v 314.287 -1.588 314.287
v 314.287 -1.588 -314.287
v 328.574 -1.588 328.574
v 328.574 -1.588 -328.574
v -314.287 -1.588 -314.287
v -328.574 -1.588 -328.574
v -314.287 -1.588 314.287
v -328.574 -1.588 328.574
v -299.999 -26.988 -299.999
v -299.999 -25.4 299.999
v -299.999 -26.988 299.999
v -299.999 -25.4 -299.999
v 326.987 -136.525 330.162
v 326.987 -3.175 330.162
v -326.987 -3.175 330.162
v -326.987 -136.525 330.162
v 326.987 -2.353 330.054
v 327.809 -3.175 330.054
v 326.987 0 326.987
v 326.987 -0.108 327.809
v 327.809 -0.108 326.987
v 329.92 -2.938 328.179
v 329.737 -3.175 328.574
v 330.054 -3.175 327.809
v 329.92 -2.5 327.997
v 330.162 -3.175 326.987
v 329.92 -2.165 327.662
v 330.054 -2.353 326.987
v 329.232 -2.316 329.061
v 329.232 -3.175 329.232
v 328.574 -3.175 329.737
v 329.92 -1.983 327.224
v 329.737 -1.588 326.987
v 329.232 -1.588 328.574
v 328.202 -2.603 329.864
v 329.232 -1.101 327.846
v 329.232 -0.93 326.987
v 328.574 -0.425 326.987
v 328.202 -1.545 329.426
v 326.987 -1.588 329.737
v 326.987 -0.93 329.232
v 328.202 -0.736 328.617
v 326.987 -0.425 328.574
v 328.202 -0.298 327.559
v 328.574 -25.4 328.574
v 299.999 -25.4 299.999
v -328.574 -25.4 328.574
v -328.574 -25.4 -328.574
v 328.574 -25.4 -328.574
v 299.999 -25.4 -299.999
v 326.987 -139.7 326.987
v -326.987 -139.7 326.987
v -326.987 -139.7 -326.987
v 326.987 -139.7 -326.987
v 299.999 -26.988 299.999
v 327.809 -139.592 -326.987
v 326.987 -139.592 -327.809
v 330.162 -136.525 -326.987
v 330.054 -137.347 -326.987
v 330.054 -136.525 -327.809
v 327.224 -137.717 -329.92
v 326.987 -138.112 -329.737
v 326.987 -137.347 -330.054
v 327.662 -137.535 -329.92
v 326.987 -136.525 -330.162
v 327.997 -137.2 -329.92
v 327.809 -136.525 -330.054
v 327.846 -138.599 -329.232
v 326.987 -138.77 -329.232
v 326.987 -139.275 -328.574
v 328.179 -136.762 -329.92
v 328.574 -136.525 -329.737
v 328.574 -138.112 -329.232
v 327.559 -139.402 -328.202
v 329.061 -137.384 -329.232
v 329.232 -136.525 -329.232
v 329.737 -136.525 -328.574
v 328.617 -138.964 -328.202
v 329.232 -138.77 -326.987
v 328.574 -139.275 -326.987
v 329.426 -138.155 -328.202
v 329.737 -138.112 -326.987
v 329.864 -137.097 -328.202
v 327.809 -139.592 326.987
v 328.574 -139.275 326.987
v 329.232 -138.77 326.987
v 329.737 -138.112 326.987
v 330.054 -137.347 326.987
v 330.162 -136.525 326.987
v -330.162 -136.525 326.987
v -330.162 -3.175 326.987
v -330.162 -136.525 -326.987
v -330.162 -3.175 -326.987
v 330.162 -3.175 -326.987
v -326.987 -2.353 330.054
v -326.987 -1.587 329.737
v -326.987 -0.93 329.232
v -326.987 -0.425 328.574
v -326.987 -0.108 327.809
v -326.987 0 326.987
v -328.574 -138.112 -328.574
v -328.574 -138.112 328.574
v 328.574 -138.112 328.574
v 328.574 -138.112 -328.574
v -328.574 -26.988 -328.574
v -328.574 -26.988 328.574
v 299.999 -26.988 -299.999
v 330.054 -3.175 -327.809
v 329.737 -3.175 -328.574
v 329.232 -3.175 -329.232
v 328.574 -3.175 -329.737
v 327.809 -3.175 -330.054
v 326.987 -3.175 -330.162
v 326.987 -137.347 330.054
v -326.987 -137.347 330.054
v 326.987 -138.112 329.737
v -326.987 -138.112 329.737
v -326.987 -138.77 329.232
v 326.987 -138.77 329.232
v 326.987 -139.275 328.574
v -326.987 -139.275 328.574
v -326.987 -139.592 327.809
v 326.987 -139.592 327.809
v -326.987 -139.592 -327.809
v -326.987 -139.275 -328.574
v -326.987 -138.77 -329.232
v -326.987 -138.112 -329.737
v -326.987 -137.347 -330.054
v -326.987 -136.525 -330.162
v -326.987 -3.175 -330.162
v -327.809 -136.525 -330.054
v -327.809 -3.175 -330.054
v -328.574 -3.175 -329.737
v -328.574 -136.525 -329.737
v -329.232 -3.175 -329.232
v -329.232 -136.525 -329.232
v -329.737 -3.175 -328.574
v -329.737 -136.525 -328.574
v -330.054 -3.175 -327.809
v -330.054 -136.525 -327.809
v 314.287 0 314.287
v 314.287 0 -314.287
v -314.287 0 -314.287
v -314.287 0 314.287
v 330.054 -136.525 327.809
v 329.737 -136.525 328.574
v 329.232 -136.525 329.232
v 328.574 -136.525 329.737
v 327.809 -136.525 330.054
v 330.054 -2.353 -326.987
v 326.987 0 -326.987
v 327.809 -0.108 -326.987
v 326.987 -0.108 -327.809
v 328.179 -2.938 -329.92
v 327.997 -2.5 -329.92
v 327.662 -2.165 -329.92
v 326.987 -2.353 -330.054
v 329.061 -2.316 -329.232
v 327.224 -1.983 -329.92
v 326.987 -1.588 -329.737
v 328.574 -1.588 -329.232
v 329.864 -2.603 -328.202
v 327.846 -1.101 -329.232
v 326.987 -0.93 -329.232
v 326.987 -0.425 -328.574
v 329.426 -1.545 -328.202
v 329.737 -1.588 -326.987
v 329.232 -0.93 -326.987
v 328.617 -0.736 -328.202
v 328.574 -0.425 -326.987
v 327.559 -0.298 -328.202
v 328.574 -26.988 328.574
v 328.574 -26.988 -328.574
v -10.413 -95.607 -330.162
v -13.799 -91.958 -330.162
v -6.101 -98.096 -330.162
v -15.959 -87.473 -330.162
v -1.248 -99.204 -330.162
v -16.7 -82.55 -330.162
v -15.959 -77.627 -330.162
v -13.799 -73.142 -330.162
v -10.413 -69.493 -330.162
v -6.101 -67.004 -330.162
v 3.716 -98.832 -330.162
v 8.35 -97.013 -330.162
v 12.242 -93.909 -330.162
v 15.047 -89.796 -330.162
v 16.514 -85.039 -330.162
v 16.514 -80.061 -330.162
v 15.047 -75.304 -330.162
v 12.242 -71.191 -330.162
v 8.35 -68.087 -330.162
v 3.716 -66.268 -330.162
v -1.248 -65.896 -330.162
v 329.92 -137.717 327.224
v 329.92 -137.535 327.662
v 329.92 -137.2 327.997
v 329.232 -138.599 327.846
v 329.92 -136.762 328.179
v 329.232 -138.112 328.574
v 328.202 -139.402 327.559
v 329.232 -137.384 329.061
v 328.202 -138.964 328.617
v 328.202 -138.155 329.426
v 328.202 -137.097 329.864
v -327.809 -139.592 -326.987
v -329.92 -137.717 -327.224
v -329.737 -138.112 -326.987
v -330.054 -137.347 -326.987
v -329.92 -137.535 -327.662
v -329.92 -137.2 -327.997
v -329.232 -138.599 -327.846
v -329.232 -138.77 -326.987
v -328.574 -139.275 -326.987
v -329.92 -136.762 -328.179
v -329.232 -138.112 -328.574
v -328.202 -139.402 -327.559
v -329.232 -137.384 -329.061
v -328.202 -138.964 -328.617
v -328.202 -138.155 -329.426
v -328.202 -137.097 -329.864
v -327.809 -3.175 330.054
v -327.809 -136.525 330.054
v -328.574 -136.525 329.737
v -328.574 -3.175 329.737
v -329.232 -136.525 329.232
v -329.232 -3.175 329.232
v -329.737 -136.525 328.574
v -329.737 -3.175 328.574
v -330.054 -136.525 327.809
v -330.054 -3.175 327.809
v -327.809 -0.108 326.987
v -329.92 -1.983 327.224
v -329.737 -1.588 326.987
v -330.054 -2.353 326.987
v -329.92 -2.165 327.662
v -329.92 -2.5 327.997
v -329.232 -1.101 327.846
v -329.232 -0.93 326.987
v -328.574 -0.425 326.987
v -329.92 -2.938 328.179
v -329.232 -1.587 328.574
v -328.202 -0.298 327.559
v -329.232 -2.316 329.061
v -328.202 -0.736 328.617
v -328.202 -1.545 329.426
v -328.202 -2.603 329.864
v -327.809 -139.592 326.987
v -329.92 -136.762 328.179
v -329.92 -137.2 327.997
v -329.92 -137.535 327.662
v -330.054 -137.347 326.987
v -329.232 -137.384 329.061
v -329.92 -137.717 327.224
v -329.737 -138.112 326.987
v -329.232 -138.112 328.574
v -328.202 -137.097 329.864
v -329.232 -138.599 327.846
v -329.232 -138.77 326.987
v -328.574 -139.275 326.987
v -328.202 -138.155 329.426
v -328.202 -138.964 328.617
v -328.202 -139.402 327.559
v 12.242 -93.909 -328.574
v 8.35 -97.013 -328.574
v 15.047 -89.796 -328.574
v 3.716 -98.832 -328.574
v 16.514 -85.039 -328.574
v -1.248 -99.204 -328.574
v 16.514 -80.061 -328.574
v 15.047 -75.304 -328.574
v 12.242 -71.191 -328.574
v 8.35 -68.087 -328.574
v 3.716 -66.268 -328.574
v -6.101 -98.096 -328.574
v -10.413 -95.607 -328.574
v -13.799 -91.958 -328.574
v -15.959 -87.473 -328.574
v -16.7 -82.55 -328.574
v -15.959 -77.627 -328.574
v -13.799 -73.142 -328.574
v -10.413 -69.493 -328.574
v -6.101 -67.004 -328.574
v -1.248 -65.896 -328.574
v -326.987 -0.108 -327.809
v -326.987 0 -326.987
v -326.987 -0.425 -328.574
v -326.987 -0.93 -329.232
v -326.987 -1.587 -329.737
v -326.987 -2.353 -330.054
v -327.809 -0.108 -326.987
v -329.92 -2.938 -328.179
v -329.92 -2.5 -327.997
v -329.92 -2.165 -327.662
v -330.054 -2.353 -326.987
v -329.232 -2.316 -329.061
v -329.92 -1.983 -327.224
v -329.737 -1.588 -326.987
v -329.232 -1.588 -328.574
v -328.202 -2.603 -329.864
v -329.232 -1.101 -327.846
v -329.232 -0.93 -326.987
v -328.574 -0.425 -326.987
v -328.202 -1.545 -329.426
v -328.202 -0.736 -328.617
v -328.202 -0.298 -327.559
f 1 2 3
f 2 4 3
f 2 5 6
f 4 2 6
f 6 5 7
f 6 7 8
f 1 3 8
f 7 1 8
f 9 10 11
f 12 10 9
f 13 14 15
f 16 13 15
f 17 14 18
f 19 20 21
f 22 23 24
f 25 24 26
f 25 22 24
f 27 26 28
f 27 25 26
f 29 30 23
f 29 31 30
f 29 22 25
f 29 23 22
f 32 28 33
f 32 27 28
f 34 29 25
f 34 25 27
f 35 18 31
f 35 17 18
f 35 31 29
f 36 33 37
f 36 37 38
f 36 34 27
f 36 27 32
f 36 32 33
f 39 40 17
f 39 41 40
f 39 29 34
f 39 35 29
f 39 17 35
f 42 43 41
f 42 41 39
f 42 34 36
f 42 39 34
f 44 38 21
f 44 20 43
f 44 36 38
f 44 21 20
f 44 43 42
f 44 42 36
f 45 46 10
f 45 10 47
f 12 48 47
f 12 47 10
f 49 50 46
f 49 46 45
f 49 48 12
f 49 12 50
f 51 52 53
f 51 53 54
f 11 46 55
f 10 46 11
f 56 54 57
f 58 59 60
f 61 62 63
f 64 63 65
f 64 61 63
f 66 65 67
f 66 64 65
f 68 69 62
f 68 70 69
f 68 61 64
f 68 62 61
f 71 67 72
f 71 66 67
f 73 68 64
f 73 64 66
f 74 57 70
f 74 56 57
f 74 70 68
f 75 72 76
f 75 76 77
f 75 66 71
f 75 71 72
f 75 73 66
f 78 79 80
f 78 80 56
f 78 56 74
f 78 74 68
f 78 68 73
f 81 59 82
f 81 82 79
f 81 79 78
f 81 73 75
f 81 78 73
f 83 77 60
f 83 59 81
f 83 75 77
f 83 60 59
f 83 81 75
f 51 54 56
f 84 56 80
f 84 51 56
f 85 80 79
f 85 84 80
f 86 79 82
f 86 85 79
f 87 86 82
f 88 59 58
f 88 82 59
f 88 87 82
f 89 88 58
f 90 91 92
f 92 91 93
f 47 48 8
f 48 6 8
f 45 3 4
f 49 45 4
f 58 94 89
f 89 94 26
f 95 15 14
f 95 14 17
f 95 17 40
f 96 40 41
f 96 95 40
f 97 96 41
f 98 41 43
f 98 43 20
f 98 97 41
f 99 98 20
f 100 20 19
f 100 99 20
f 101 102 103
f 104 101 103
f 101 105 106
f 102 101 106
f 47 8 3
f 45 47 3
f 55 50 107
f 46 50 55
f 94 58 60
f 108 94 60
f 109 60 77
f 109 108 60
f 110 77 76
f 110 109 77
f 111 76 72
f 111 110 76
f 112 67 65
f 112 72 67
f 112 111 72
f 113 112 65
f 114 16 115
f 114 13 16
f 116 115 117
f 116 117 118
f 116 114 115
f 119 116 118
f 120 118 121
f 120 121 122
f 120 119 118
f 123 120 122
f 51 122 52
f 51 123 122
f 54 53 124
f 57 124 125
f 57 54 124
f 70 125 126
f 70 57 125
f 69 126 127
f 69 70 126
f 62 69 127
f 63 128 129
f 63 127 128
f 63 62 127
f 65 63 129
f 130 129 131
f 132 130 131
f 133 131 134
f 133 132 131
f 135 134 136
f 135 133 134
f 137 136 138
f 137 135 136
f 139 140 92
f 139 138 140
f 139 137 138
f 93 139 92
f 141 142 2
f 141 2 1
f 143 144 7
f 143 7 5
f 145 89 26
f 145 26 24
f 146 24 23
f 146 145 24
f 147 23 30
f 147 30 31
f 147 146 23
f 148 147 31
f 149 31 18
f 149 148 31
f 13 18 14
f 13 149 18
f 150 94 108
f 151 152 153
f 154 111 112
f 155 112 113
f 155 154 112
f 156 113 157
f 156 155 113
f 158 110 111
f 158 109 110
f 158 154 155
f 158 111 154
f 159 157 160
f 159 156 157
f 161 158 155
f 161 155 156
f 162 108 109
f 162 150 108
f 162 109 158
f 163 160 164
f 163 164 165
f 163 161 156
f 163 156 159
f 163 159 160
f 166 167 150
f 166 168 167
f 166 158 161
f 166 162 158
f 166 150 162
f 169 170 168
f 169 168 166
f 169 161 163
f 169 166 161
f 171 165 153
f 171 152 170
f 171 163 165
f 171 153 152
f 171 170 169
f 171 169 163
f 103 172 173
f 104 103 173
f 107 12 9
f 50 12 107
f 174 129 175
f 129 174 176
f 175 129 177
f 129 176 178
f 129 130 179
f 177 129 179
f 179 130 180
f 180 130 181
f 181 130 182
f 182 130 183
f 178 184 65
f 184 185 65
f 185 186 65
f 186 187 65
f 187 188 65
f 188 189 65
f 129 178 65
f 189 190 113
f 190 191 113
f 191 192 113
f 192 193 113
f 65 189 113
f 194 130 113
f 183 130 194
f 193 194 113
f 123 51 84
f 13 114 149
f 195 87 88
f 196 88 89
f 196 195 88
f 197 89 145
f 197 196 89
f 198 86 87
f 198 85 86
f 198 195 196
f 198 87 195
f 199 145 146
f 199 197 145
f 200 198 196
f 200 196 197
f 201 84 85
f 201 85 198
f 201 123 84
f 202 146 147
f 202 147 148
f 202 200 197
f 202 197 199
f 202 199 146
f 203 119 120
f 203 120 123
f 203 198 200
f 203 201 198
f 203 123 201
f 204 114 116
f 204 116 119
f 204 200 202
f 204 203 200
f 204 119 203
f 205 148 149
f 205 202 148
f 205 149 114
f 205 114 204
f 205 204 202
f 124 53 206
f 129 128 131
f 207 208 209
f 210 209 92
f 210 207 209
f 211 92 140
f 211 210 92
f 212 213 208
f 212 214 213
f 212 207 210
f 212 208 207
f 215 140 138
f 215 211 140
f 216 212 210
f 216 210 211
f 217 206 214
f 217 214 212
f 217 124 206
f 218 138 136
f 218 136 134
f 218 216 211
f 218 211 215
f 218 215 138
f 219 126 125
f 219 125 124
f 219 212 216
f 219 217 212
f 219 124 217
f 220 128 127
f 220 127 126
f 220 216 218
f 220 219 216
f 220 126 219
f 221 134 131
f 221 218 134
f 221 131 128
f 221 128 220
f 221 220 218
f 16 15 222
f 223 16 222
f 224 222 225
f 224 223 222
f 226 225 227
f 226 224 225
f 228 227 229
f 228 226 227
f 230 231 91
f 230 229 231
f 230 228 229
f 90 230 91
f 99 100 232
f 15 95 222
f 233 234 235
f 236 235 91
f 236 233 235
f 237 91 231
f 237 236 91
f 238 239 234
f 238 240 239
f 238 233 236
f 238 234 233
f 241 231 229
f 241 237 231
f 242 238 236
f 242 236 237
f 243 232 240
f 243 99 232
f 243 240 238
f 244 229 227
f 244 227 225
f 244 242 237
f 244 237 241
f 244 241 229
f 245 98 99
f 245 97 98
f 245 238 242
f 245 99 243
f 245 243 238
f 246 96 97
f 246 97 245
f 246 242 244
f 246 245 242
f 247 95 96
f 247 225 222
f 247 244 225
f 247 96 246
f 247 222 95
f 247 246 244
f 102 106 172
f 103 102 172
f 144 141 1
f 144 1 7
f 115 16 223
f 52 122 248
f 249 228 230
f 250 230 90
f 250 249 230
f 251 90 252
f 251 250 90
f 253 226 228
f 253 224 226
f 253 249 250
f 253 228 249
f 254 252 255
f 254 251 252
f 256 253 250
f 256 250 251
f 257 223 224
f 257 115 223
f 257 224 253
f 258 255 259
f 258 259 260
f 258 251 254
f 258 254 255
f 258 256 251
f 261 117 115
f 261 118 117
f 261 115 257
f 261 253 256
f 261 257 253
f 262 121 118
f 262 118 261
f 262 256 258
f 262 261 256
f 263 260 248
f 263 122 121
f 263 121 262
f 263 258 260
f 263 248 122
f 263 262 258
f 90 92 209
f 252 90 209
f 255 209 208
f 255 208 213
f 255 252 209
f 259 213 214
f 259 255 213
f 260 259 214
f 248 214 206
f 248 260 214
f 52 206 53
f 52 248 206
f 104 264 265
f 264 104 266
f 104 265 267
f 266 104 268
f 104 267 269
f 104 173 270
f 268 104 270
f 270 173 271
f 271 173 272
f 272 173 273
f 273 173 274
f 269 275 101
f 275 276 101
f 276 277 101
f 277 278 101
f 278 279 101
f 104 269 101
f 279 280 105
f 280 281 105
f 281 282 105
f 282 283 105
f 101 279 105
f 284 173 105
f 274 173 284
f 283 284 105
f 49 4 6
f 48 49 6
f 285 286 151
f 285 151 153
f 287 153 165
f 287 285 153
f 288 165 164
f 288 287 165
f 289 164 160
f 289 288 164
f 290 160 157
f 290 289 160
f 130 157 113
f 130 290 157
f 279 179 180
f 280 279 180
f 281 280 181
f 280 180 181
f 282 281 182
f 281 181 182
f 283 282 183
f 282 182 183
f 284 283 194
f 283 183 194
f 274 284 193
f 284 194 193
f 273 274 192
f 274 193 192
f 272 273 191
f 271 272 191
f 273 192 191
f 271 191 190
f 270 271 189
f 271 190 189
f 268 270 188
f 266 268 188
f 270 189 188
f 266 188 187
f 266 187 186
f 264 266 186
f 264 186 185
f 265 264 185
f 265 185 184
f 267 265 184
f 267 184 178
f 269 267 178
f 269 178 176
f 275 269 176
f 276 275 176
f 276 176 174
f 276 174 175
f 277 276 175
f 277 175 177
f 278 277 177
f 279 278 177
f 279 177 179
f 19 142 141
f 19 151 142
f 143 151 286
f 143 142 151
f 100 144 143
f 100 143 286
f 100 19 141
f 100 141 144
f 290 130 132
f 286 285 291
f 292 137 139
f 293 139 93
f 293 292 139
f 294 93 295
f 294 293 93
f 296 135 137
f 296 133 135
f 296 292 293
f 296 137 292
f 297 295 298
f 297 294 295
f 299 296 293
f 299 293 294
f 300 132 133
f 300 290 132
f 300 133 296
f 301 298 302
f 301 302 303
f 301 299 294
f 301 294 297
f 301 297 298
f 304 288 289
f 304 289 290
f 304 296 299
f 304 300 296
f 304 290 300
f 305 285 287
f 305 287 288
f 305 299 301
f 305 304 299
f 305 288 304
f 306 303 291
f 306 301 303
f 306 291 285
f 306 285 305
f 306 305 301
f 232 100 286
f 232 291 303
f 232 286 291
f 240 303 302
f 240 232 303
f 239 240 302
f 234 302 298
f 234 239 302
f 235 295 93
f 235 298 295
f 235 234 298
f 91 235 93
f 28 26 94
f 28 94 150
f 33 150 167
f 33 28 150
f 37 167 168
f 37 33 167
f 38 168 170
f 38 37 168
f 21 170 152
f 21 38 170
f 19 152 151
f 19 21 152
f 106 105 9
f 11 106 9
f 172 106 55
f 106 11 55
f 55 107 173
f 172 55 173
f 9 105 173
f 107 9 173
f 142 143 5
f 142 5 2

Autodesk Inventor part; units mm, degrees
ref_plane "YZ Plane" through (0, 0, 0) normal (1, 0, 0) x (0, 1, 0)
ref_plane "XZ Plane" through (0, 0, 0) normal (0, 1, 0) x (-1, 0, 0)
sketch "Sketch1" plane through (0, 0, 0) normal (0, 1, 0) x (-1, 0, 0)
  line L0 (-462.2267, 0) -> (462.2267, 0) projected
  line L1 (0, -462.2267) -> (0, 462.2267) projected
  line L2 (-330.1619, 330.1619) -> (330.1619, 330.1619)
  line L3 (330.1619, 330.1619) -> (330.1619, -330.1619)
  line L4 (330.1619, -330.1619) -> (-330.1619, -330.1619)
  line L5 (-330.1619, -330.1619) -> (-330.1619, 330.1619)
  line L6 (462.2267, 0) -> (-462.2267, 0) projected
  line L7 (0, -462.2267) -> (0, 462.2267) projected
  line L8 (314.2869, -314.2869) -> (-314.2869, -314.2869)
  line L9 (-314.2869, -314.2869) -> (-314.2869, 314.2869)
  line L10 (-314.2869, 314.2869) -> (314.2869, 314.2869)
  line L11 (314.2869, 314.2869) -> (314.2869, -314.2869)
  point P0 (0, 0)
  dimension "d0" = 660.3238
  dimension "d2" = 660.3238
  dimension "d123" = 15.875
  dimension "d124" = 15.875
extrude "Extrusion1" add sketch "Sketch1" against normal blind 1.5875 contours L5 L2 L1 L10 L9 L0 | L0 L9 L8 L1 L4 L5 | L1 L8 L11 L0 L3 L4 | L2 L3 L0 L11 L10 L1
sketch "Sketch2" plane through (0, -1.5875, 0) normal (0, -1, 0) x (1, 0, 0)
  line L0 (330.1619, 330.1619) -> (-330.1619, 330.1619) projected
  line L1 (-330.1619, 330.1619) -> (-330.1619, -330.1619) projected
  line L2 (-330.1619, -330.1619) -> (330.1619, -330.1619) projected
  line L3 (330.1619, -330.1619) -> (330.1619, 330.1619) projected
  line L4 (-314.2869, -314.2869) -> (-314.2869, 314.2869) projected
  line L5 (-314.2869, 314.2869) -> (314.2869, 314.2869) projected
  line L6 (314.2869, 314.2869) -> (314.2869, -314.2869) projected
  line L7 (314.2869, -314.2869) -> (-314.2869, -314.2869) projected
  line L8 (330.1619, 330.1619) -> (-330.1619, 330.1619) projected
  line L9 (-330.1619, 330.1619) -> (-330.1619, -330.1619) projected
  line L10 (-330.1619, -330.1619) -> (330.1619, -330.1619) projected
  line L11 (330.1619, -330.1619) -> (330.1619, 330.1619) projected
  line L12 (0, -462.2267) -> (0, 462.2267) projected
  line L13 (-462.2267, 0) -> (462.2267, 0) projected
  line L14 (-328.5744, 328.5744) -> (328.5744, 328.5744)
  line L15 (328.5744, 328.5744) -> (328.5744, -328.5744)
  line L16 (328.5744, -328.5744) -> (-328.5744, -328.5744)
  line L17 (-328.5744, -328.5744) -> (-328.5744, 328.5744)
  point P0 (0, 0)
  dimension "d7" = 1.5875
  dimension "d8" = 1.5875
extrude "Extrusion2" add sketch "Sketch2" along normal blind 136.525 contours L3 L13 L15 L14 L12 L0 | L12 L14 L17 L13 L1 L0 | L3 L2 L12 L16 L15 L13 | L13 L17 L16 L12 L2 L1
sketch "Sketch3" plane through (0, -138.1125, 0) normal (0, -1, 0) x (1, 0, 0)
  line L0 (-462.2267, 0) -> (462.2267, 0) projected
  line L1 (0, -462.2267) -> (0, 462.2267) projected
  line L2 (-330.1619, 330.1619) -> (330.1619, 330.1619)
  line L3 (330.1619, 330.1619) -> (330.1619, -330.1619)
  line L4 (330.1619, -330.1619) -> (-330.1619, -330.1619)
  line L5 (-330.1619, -330.1619) -> (-330.1619, 330.1619)
  point P0 (0, 0)
extrude "Extrusion3" add sketch "Sketch3" along normal blind 1.5875
ref_plane "Work Plane1" through (0, -25.4, 0) normal (0, 1, 0) x (1, 0, 0)
sketch "Sketch4" plane through (0, -25.4, 0) normal (0, 1, 0) x (1, 0, 0)
  line L0 (328.5744, -328.5744) -> (328.5744, 328.5744) projected
  line L1 (328.5744, 328.5744) -> (-328.5744, 328.5744) projected
  line L2 (-328.5744, 328.5744) -> (-328.5744, -328.5744) projected
  line L3 (-328.5744, -328.5744) -> (328.5744, -328.5744) projected
  line L4 (-330.1619, -330.1619) -> (-330.1619, 330.1619) projected
  line L5 (-330.1619, 330.1619) -> (330.1619, 330.1619) projected
  line L6 (330.1619, 330.1619) -> (330.1619, -330.1619) projected
  line L7 (330.1619, -330.1619) -> (-330.1619, -330.1619) projected
  line L8 (-299.9994, 299.9994) -> (299.9994, 299.9994)
  line L9 (299.9994, 299.9994) -> (299.9994, -299.9994)
  line L10 (299.9994, -299.9994) -> (-299.9994, -299.9994)
  line L11 (-299.9994, -299.9994) -> (-299.9994, 299.9994)
  line L12 (462.2267, 0) -> (-462.2267, 0) projected
  line L13 (0, 462.2267) -> (0, -462.2267) projected
  point P0 (0, 0)
  dimension "d121" = 30.1625
  dimension "d122" = 30.1625
extrude "Extrusion4" add sketch "Sketch4" against normal blind 1.5875 contours L3 L13 L10 L9 L12 L0 | L12 L9 L8 L13 L1 L0 | L3 L2 L12 L11 L10 L13 | L13 L8 L11 L12 L2 L1
fillet "Fillet1" radius 3.175 12 edges at (0, 0, 330.1619) (0, -139.7, 330.1619) (330.1619, -69.85, 330.1619) (330.1619, -139.7, 0) (330.1619, 0, 0) (330.1619, -69.85, -330.1619) (0, 0, -330.1619) (-330.1619, 0, 0) (-330.1619, -69.85, 330.1619) (0, -139.7, -330.1619) (-330.1619, -69.85, -330.1619) (-330.1619, -139.7, 0)
sketch "Sketch5" plane through (330.1619, 0, -330.1619) normal (0, 0, -1) x (-1, 0, 0)
  line L0 (660.3238, -139.7) -> (0, -139.7) projected
  line L1 (330.1619, -167.64) -> (330.1619, 27.94) projected
  circle A0 centre (330.1619, -82.55) radius 16.7005
  line L2 (657.1488, 0) -> (3.175, 0) projected
  line L3 (3.175, -139.7) -> (657.1488, -139.7) projected
  point P0 (330.1619, 0)
  dimension "d74" = 57.15
  dimension "d75" = 33.401
extrude "Extrusion10" cut sketch "Sketch5" against normal up to surface (1.5875 mm away)
sketch "Sketch6" plane through (-328.5744, -138.1125, -328.5744) normal (0, 0, 1) x (1, 0, 0)
  circle A0 centre (298.4119, 42.8625) radius 15.875 projected
  circle A1 centre (298.4119, 42.8625) radius 15.875
  circle A2 centre (298.4119, 42.8625) radius 12.7
  point P0 (328.5744, 138.1125)
  dimension "d83" = 25.4
sketch "Sketch7" plane through (330.1619, -136.525, 326.9869) normal (1, 0, 0) x (0, 0, -1)
  line L0 (653.9738, 136.525) -> (0, 136.525) projected
  line L1 (326.9869, -31.115) -> (326.9869, 164.465) projected
  circle A0 centre (55.5752, 120.65) radius 3.175
  line L2 (-1.5875, 134.9375) -> (-1.5875, 111.125) projected
  line L3 (-3.175, 133.35) -> (-3.175, 0) projected
  circle A1 centre (598.3986, 120.65) radius 3.175
  point P0 (326.9869, 136.525)
  dimension "d91" = 6.35
  dimension "d95" = 58.7502
  dimension "d96" = 15.875
properties part number "Propane Burner" material "Steel"
